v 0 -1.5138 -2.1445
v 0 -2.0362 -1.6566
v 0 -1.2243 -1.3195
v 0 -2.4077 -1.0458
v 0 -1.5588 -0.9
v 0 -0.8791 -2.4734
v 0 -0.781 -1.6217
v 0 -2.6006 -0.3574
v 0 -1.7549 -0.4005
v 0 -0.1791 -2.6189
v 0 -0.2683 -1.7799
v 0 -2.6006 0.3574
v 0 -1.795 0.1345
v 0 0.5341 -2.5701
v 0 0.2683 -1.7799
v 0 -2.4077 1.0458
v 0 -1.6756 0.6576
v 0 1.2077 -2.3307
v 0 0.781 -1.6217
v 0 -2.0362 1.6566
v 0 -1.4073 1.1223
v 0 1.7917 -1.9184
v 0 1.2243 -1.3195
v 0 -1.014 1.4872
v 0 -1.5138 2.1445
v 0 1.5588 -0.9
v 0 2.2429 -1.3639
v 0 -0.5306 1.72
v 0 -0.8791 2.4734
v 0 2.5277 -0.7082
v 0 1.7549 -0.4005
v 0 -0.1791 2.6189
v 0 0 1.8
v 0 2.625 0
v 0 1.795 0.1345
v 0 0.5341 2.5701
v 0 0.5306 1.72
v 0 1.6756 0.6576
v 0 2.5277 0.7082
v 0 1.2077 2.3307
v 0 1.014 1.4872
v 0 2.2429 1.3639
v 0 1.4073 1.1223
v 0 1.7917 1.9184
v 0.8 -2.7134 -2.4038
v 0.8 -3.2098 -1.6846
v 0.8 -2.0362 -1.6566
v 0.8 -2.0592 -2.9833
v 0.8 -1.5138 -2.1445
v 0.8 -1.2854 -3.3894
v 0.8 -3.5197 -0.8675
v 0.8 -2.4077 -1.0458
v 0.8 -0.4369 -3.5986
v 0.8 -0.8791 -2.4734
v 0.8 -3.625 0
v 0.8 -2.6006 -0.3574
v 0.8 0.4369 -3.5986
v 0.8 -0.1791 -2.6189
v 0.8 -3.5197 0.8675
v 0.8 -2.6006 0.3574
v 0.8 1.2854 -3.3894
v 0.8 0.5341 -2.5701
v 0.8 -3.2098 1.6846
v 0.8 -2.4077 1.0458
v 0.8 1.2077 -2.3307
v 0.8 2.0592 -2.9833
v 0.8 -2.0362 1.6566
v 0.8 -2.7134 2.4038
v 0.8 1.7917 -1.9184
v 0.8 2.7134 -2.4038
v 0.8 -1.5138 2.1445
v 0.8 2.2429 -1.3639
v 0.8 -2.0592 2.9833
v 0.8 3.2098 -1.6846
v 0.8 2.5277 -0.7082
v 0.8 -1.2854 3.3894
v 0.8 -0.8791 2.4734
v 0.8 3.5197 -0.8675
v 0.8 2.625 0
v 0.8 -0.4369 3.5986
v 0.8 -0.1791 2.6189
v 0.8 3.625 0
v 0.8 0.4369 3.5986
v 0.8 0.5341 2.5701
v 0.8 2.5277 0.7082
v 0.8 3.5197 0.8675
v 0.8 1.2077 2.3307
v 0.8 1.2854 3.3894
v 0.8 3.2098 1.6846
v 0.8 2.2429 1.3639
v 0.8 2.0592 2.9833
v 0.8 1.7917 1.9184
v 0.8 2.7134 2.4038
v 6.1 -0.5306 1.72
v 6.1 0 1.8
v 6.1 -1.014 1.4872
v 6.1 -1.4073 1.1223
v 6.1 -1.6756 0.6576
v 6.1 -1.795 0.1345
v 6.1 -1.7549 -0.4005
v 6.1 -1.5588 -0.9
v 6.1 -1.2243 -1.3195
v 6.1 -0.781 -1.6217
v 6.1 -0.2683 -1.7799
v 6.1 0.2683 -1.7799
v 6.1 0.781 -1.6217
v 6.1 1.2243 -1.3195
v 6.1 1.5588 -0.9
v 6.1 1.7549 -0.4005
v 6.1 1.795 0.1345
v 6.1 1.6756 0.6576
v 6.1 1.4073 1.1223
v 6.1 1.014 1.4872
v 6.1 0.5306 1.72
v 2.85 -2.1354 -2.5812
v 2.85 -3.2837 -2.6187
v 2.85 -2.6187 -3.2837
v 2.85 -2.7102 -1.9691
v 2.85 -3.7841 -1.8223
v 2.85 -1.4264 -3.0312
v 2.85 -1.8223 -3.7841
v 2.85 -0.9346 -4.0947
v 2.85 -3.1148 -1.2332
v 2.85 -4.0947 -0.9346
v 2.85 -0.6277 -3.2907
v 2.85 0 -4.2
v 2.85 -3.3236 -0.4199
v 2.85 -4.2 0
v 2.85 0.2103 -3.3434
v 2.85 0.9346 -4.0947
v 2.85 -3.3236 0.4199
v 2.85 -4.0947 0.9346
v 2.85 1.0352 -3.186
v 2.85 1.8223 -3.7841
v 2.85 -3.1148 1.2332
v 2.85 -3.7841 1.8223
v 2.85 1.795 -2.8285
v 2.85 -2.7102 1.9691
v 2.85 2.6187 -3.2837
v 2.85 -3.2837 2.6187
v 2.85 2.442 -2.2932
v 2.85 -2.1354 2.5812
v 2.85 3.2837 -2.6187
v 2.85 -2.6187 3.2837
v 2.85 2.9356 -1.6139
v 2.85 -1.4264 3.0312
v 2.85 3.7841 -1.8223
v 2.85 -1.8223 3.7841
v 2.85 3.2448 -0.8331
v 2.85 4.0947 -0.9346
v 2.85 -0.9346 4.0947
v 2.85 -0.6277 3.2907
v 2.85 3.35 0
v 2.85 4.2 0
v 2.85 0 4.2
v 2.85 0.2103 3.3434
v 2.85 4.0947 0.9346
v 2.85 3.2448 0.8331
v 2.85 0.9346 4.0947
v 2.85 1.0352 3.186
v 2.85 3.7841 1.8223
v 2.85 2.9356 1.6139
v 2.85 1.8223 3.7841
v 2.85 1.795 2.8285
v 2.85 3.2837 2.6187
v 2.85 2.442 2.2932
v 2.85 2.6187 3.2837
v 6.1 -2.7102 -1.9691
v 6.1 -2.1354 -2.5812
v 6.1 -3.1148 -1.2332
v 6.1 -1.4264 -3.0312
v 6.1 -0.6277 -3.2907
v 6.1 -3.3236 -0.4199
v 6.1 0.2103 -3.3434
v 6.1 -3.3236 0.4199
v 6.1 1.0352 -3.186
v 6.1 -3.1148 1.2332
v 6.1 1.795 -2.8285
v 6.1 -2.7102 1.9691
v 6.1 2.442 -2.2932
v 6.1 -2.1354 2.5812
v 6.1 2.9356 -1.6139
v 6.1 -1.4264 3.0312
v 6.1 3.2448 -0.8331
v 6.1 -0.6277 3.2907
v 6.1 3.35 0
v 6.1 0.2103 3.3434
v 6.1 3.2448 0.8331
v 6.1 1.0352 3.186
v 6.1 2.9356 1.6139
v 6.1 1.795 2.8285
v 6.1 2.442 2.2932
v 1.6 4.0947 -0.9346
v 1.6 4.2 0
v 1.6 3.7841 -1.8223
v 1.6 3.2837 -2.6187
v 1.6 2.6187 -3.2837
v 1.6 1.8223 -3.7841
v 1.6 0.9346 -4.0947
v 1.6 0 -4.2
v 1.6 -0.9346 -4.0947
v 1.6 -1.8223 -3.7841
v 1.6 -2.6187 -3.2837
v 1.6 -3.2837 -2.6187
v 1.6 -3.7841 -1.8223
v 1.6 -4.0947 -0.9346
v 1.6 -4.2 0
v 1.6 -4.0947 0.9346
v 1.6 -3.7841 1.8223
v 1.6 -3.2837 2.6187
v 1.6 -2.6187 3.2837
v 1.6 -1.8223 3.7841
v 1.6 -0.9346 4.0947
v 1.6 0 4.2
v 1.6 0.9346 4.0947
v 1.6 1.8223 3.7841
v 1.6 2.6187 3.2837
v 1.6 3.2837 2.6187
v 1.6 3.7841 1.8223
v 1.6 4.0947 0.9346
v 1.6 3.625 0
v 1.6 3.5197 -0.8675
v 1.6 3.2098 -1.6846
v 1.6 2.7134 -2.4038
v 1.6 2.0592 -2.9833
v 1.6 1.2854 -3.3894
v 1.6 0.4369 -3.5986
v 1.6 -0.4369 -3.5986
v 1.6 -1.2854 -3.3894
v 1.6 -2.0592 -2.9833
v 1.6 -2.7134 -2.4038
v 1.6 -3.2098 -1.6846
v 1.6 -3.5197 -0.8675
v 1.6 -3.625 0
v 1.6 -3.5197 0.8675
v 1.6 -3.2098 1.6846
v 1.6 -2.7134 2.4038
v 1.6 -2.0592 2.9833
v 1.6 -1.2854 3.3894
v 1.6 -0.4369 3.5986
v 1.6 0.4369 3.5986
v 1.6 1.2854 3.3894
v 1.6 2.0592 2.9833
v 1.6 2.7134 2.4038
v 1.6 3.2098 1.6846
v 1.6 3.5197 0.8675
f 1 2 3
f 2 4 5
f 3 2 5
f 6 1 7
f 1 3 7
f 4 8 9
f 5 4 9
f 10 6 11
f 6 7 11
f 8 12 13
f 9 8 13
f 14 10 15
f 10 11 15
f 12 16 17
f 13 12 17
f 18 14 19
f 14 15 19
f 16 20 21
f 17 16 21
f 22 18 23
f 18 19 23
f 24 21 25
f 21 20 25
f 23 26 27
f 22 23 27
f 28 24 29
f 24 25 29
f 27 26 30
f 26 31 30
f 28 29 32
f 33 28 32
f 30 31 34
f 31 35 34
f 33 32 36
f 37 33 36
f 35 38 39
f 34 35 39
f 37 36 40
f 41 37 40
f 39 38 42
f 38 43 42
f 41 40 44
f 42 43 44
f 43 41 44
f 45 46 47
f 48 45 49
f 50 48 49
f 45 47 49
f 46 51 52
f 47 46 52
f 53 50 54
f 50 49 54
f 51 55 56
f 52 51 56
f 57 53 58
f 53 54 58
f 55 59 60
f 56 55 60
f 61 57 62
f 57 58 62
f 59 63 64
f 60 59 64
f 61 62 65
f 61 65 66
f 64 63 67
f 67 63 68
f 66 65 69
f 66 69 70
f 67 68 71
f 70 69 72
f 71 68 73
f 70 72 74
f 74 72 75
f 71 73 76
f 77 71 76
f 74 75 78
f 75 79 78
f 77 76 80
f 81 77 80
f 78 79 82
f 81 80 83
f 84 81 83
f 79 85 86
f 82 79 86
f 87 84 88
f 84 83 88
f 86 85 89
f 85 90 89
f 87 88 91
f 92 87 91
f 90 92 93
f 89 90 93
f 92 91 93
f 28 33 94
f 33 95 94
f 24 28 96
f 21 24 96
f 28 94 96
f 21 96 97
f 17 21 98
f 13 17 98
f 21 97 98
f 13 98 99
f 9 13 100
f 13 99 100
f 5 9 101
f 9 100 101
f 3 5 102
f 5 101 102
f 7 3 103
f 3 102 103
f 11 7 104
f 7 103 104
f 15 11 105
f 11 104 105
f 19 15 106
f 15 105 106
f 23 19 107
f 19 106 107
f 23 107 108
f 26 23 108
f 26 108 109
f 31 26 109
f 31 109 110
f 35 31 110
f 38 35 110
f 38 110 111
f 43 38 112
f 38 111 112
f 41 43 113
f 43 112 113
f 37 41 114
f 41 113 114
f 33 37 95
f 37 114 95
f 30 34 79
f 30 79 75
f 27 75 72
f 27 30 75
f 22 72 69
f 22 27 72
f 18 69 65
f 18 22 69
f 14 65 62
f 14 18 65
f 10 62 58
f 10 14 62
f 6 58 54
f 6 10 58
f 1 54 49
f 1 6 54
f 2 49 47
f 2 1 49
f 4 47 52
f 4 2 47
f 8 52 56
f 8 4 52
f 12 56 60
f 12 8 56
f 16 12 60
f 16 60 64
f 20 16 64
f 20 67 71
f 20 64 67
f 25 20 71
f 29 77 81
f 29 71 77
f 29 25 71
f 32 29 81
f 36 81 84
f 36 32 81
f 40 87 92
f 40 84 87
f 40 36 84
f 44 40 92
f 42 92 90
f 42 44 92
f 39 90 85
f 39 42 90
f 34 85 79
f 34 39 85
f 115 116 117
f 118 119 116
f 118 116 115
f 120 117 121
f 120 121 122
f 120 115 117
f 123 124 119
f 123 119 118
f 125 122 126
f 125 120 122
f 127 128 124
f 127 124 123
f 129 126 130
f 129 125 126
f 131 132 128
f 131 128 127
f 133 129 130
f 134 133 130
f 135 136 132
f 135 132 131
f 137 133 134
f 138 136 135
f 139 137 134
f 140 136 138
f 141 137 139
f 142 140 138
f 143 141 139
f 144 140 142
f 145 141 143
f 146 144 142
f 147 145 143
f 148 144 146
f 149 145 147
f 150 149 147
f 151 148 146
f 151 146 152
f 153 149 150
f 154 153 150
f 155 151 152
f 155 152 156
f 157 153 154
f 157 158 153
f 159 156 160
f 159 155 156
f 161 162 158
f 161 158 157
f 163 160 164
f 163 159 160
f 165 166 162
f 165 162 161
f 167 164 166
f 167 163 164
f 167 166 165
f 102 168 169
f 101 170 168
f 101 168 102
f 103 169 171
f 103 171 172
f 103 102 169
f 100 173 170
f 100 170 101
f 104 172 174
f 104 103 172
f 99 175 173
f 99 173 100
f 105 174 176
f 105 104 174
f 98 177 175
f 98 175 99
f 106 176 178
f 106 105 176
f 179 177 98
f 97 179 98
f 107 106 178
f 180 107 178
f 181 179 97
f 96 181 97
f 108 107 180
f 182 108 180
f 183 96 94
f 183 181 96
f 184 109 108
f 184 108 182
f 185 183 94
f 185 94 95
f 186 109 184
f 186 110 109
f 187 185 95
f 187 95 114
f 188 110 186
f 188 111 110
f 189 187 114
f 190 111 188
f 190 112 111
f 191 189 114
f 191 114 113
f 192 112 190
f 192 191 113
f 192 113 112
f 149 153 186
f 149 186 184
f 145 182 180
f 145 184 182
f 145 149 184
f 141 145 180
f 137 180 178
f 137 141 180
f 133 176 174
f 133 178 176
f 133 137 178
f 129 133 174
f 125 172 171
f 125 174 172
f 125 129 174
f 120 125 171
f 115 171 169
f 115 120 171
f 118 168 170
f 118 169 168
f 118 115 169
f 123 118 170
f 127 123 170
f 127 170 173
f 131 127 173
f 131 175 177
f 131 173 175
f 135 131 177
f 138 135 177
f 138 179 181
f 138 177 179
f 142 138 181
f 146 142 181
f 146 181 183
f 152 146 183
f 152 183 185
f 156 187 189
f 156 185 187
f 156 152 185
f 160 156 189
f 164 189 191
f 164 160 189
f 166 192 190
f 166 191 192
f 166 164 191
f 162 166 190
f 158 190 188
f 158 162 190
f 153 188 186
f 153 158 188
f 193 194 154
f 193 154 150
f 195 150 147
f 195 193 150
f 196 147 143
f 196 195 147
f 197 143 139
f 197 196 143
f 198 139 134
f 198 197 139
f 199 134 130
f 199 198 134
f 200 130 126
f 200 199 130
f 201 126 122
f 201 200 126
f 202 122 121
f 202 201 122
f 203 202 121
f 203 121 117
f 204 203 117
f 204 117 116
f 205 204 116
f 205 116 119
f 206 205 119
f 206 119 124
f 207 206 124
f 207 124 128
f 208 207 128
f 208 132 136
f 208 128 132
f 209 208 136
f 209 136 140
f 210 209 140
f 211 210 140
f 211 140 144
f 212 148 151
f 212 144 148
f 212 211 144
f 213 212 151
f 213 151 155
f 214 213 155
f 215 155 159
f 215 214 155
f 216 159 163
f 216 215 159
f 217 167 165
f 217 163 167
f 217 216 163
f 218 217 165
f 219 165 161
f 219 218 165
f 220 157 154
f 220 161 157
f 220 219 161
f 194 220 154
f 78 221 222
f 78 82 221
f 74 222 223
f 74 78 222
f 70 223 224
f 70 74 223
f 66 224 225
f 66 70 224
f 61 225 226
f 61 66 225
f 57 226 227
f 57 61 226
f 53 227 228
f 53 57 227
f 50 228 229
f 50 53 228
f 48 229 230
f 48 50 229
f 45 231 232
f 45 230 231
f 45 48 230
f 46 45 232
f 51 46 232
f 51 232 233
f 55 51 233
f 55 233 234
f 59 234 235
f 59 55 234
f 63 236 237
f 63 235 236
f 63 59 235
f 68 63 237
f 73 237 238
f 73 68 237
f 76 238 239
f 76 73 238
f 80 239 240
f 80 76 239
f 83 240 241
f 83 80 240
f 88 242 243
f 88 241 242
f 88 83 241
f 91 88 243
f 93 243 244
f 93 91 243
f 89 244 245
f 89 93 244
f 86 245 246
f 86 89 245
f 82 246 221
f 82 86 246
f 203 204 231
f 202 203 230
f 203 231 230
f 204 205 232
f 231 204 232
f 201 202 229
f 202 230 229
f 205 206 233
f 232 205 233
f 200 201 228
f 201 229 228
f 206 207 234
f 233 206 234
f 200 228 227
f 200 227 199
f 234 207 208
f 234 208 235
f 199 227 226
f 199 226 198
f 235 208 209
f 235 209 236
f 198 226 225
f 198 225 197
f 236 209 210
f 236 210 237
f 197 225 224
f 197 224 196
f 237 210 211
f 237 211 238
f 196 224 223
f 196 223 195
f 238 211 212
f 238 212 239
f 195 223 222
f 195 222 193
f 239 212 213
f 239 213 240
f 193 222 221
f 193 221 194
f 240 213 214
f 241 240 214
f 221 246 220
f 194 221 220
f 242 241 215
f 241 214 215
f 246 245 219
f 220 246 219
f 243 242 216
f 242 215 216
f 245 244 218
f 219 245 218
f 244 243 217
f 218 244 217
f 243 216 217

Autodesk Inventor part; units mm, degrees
ref_plane "YZ Plane" through (0, 0, 0) normal (1, 0, 0) x (0, 1, 0)
ref_plane "XZ Plane" through (0, 0, 0) normal (0, 1, 0) x (-1, 0, 0)
ref_plane "XY Plane" through (0, 0, 0) normal (0, 0, 1) x (1, 0, 0)
sketch "Sketch1" plane through (0, 0, 0) normal (0, 0, 1) x (1, 0, 0)
  line L0 (0, 0) -> (0.8, 0)
  line L1 (0.8, 0) -> (0.8, 2.625)
  line L2 (0.8, 2.625) -> (0, 2.625)
  line L3 (0, 2.625) -> (0, 0)
  line L4 (0.8, 0) -> (1.6, 0)
  line L5 (1.6, 0) -> (1.6, 3.625)
  line L6 (1.6, 3.625) -> (0.8, 3.625)
  line L7 (0.8, 3.625) -> (0.8, 0)
  line L8 (1.6, 0) -> (2.85, 0)
  line L9 (2.85, 0) -> (2.85, 4.2)
  line L10 (2.85, 4.2) -> (1.6, 4.2)
  line L11 (1.6, 4.2) -> (1.6, 0)
  line L12 (2.85, 0) -> (6.1, 0)
  line L13 (6.1, 0) -> (6.1, 3.35)
  line L14 (6.1, 3.35) -> (2.85, 3.35)
  line L15 (2.85, 3.35) -> (2.85, 0)
  dimension "d0" = 5.25
  dimension "d1" = 7.25
  dimension "d2" = 8.4
  dimension "d3" = 6.7
  dimension "d4" = 0.8
  dimension "d7" = 1.6
  dimension "d8" = 2.85
  dimension "d9" = 6.1
revolve "Revolution1" add sketch "Sketch1" angle 360 about axis through (0, 0, 0) along (1, 0, 0)
hole "Hole1" at (0, 0, 0) direction (1, 0, 0) diameter 3.6 end through all
properties part number "308-14" material "Polypropylene"
